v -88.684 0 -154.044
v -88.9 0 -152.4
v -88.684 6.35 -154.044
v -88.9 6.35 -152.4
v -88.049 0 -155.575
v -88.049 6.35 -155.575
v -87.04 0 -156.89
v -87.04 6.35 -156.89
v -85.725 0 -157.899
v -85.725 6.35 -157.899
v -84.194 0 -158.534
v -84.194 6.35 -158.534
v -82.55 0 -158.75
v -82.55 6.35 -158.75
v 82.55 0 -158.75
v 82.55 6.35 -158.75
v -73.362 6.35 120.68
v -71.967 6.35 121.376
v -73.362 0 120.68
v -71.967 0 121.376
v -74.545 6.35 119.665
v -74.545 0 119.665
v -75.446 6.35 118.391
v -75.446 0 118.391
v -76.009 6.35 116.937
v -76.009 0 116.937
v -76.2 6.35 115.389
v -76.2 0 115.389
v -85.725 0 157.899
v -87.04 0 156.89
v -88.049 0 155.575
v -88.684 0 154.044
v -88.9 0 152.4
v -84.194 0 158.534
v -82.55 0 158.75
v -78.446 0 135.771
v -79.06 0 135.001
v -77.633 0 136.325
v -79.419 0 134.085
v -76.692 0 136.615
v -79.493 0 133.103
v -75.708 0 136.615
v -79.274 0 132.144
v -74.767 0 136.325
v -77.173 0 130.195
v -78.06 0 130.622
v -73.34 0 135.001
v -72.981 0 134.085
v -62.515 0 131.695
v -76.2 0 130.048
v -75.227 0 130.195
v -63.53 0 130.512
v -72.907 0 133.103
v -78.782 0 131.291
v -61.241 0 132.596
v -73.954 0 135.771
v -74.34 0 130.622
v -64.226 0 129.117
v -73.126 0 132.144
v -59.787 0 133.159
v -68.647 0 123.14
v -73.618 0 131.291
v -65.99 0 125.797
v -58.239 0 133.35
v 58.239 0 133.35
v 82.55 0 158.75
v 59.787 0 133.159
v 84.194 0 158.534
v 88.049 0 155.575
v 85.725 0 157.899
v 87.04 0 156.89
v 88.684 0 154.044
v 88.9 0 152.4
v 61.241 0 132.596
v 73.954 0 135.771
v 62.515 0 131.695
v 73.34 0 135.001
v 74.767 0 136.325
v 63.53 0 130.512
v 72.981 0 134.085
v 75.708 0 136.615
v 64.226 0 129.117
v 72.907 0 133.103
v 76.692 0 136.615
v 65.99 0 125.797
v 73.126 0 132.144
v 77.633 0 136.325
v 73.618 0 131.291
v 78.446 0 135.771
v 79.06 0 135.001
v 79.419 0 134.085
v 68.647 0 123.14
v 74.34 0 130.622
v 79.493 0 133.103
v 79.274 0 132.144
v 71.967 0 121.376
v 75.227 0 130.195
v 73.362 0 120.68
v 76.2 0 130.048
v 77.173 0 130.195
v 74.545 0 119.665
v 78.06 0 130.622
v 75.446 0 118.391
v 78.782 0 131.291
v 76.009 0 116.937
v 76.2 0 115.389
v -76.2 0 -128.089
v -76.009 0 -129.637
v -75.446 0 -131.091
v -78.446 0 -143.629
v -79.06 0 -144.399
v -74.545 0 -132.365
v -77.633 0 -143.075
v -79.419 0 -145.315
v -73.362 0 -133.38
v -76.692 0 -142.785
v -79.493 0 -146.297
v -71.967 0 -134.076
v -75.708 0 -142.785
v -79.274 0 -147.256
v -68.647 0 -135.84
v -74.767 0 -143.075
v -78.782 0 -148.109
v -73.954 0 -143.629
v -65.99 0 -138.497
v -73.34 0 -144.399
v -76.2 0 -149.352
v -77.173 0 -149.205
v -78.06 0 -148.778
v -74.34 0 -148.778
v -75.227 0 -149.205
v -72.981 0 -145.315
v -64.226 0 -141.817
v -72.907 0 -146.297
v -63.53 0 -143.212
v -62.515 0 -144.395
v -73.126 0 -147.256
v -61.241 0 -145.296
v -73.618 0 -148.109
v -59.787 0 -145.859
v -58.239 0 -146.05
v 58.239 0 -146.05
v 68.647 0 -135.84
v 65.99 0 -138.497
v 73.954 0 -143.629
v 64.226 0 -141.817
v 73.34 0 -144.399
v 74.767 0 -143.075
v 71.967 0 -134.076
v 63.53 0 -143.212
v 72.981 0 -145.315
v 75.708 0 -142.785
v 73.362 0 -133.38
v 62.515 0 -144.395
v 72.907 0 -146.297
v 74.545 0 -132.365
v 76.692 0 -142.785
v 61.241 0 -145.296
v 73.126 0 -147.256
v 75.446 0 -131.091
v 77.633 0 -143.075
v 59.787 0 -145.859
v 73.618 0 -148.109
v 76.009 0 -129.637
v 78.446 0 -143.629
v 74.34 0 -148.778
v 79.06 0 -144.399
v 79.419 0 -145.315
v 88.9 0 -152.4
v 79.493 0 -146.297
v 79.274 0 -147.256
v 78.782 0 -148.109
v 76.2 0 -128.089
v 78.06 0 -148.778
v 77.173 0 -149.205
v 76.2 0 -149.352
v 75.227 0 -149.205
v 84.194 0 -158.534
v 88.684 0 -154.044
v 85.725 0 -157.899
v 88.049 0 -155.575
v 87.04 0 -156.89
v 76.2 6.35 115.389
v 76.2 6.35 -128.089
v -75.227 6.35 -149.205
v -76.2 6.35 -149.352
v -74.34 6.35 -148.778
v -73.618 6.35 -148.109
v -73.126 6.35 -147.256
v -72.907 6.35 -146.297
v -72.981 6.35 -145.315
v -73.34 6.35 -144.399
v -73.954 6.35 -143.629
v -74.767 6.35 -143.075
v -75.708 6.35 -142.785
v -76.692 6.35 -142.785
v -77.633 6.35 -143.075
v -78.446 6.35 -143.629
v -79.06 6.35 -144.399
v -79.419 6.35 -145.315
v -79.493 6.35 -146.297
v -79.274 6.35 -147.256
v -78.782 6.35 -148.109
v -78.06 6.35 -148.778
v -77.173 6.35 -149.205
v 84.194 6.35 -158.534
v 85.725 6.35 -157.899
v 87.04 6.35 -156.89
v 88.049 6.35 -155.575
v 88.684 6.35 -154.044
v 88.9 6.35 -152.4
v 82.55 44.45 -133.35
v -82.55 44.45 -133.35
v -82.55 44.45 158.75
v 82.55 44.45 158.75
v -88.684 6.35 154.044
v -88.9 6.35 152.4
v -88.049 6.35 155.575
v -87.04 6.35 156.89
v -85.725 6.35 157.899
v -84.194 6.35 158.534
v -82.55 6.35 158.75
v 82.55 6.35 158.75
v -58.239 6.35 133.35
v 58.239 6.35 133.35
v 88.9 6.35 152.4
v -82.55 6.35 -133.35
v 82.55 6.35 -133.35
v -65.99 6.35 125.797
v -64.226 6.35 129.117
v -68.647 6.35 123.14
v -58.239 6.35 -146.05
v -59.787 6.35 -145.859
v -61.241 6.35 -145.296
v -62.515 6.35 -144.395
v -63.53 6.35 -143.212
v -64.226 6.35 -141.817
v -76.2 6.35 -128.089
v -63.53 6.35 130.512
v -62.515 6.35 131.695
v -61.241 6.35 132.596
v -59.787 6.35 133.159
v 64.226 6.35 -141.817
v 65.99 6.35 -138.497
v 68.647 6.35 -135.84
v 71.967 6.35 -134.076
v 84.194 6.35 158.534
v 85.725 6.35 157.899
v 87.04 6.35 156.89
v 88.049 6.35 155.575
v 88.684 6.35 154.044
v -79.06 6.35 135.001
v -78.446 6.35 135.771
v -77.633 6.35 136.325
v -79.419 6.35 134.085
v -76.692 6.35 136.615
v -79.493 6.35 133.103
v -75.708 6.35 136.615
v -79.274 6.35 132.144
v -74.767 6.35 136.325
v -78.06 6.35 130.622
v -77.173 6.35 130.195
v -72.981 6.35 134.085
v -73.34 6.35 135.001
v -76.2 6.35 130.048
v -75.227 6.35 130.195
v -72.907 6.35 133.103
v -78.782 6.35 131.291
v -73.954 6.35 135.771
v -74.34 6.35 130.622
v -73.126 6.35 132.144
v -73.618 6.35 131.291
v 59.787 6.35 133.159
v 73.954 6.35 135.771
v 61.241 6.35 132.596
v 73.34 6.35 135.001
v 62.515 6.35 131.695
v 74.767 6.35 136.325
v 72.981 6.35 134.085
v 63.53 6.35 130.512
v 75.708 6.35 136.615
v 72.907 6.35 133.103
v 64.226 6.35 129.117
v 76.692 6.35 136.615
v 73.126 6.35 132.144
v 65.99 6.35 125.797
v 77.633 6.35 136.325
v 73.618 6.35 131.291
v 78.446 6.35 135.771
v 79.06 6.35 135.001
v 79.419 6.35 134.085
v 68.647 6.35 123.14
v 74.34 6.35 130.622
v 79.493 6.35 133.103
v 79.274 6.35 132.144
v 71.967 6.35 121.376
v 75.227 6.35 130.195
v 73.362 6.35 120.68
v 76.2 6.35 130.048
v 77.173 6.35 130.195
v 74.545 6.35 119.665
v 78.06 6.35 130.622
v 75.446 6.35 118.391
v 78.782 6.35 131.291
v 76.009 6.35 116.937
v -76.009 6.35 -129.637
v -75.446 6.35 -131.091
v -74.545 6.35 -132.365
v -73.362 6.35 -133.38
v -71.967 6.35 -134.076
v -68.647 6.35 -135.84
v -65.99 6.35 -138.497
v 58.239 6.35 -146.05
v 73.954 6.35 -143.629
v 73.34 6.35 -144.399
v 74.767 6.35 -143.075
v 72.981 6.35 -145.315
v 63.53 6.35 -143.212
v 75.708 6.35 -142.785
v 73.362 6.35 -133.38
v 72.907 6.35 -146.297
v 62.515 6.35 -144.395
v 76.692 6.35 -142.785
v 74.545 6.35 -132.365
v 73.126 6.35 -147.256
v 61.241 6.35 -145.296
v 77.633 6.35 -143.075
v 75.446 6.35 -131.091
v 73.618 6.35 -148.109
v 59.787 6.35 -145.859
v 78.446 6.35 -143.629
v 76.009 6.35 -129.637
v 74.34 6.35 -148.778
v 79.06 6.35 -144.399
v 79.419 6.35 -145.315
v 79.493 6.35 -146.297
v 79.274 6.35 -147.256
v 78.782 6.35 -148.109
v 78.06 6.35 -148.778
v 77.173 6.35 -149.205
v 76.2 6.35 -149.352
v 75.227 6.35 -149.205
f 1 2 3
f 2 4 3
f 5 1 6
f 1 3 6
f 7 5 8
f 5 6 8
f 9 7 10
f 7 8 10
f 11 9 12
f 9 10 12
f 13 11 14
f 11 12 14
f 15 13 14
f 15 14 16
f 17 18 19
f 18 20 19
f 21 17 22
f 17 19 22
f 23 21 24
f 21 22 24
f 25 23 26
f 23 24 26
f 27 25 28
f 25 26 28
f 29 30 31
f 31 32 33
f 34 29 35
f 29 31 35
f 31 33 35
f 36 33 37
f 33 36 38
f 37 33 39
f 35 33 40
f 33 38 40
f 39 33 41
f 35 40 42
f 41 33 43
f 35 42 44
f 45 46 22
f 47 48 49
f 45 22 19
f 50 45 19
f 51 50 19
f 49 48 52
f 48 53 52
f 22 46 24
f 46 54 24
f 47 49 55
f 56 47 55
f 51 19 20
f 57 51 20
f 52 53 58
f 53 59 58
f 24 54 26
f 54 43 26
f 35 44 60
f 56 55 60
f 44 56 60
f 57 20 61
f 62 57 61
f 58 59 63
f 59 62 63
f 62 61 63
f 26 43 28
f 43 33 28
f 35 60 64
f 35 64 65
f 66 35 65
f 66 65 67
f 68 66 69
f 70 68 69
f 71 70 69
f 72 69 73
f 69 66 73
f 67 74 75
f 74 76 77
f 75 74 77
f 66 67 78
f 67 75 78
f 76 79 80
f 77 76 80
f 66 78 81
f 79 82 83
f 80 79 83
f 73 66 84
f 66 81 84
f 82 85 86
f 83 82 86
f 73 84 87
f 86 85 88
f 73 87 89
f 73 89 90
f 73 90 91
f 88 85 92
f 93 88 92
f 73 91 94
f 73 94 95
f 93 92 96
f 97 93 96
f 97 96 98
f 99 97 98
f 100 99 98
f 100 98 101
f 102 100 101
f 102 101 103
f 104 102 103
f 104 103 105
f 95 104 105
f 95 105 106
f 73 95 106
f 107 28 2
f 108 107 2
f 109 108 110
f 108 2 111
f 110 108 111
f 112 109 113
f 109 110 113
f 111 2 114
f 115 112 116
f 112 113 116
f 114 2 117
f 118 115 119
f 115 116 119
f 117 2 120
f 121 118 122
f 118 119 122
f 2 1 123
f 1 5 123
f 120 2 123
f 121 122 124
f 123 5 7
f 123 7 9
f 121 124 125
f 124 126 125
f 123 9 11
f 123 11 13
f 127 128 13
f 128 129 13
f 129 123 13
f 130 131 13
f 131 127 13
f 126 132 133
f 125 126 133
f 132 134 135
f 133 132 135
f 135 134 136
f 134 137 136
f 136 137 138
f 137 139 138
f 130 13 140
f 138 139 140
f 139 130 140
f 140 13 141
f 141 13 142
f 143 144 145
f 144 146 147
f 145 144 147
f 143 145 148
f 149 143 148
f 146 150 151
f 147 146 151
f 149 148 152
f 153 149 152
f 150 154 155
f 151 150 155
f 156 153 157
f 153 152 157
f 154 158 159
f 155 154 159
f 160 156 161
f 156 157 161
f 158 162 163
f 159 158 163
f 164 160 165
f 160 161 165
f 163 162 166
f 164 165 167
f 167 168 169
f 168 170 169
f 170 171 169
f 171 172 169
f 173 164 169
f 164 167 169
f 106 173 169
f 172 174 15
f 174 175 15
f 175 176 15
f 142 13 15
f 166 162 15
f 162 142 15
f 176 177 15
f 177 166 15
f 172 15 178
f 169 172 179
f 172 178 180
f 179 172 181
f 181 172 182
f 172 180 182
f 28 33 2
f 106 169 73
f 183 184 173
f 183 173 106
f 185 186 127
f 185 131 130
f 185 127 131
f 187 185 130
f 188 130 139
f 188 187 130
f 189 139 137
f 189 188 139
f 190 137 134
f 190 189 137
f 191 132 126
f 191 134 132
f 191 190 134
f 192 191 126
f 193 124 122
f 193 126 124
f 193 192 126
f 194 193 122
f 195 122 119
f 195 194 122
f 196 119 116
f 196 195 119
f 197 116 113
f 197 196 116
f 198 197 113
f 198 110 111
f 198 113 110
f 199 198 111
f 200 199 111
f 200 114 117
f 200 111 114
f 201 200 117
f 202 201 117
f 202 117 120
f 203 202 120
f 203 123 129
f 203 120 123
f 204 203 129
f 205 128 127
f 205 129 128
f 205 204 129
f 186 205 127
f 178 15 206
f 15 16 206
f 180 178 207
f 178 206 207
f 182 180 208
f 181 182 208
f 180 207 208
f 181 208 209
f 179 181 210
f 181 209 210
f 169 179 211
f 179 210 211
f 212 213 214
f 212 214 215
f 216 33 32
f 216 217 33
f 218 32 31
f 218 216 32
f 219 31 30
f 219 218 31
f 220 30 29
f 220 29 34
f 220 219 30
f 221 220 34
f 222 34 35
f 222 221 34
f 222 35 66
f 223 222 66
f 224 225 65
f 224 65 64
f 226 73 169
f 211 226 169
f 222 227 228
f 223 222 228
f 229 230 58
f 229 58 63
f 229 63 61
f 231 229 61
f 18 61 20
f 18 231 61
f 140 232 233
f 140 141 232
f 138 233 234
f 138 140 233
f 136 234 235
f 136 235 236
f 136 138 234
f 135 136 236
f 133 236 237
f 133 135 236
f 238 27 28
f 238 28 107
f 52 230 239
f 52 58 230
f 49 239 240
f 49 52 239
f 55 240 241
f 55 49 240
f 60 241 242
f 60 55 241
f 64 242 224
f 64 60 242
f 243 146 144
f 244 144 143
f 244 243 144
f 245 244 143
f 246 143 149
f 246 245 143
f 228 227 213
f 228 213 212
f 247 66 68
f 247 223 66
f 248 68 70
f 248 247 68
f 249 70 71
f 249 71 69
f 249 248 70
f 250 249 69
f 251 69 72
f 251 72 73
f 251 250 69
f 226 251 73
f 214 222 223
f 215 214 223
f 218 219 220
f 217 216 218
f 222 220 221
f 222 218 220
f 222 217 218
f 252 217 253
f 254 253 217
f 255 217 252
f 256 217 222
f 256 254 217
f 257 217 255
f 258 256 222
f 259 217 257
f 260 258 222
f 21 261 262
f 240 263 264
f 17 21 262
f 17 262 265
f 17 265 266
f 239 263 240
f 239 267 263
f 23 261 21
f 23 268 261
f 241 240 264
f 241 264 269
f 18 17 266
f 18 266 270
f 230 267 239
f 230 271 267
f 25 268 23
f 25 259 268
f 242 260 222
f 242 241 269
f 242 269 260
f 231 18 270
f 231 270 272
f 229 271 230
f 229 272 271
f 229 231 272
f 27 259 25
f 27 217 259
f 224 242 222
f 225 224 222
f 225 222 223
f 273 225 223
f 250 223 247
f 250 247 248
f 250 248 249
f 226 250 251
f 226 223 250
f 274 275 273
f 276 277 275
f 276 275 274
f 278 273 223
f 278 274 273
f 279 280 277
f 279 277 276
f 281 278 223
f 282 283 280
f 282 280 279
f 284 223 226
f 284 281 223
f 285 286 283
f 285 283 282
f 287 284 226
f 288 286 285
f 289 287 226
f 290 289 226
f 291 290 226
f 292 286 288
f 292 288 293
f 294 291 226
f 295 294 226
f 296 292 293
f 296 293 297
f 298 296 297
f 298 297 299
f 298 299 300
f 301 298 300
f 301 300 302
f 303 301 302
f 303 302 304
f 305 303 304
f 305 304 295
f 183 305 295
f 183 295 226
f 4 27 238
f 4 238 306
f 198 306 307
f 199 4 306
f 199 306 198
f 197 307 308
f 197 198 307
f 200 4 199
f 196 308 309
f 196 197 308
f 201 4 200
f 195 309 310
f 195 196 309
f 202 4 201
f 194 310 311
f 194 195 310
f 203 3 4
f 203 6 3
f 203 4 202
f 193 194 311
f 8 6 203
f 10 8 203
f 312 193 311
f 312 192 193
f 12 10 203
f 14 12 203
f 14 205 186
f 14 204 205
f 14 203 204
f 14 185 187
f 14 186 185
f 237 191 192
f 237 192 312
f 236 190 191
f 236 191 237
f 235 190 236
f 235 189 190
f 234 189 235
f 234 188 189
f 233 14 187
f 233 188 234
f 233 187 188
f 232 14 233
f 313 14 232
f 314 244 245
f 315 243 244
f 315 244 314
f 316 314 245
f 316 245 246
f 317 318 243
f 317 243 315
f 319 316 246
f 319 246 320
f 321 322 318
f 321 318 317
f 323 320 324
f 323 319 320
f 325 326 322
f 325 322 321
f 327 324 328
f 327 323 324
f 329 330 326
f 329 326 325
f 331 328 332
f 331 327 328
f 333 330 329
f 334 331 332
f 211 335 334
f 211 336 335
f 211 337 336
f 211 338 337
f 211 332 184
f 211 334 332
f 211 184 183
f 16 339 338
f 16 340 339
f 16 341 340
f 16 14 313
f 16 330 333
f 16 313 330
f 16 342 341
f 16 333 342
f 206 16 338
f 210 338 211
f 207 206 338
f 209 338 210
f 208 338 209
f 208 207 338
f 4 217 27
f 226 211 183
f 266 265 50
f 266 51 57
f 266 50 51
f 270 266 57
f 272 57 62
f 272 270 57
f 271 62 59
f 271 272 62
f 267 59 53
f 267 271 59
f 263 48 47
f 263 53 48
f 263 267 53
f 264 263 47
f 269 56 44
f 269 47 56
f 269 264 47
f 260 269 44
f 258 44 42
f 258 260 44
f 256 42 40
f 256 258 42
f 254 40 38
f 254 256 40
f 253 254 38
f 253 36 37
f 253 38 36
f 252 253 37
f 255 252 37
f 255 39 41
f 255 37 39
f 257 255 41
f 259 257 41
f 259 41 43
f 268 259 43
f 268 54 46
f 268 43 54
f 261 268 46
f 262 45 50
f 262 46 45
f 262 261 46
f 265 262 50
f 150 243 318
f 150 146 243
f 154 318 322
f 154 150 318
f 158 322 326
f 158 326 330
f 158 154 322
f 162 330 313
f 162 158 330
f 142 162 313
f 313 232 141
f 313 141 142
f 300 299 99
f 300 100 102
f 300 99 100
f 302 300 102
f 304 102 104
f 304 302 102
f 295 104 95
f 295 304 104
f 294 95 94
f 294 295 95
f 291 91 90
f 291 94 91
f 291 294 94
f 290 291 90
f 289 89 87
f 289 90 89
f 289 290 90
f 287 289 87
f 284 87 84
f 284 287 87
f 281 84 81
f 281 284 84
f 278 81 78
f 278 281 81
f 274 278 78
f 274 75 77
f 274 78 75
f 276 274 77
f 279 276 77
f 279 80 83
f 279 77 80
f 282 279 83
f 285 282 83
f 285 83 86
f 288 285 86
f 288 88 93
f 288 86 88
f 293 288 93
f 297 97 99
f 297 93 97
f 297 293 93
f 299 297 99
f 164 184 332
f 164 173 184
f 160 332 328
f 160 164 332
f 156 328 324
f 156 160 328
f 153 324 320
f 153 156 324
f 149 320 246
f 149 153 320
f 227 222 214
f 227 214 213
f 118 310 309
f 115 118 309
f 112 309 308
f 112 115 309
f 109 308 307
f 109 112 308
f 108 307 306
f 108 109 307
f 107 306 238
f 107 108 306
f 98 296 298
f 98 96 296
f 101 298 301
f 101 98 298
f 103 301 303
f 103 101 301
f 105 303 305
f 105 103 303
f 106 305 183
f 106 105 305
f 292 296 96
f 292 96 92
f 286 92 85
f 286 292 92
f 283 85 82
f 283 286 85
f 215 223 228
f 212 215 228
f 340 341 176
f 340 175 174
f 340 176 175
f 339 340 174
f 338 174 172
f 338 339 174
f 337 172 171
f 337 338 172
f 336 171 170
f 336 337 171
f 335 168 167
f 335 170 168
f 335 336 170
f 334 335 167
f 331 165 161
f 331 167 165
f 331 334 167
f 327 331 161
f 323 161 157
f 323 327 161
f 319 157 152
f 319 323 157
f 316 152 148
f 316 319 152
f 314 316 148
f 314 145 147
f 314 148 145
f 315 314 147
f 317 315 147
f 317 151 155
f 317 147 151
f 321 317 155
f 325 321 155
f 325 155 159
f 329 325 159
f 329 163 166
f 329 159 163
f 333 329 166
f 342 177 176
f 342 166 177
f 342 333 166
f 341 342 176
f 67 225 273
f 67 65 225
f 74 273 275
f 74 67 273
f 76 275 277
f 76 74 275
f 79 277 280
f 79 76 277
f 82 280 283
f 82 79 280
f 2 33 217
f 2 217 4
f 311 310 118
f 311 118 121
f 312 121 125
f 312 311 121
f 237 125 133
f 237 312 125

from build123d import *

# Parameters (mm, degrees)
SKETCH1_W               = 177.8
SKETCH1_H               = 317.5
BASE_DEPTH              = 6.35
HOLES_DEPTH             = 183.057944073
HOLES_DEPTH_BACK        = 183.057944073
SKETCH3_R               = 3.302
INNER_CUTOUT_DEPTH      = 183.057944073
INNER_CUTOUT_DEPTH_BACK = 183.057944073
FILLET1_R               = 6.35
SKETCH2_W               = 165.1
SKETCH2_H               = 292.1
PADDING_DEPTH           = 38.1


with BuildPart() as part:
    # Sketch1 → Base (new body)
    with BuildSketch(Plane(origin=(0, 0, 0), x_dir=(1, 0, 0), z_dir=(0, 1, 0))):
        Rectangle(SKETCH1_W, SKETCH1_H)
    extrude(amount=BASE_DEPTH)

    # Sketch3 → Holes (cut, two sides: drawn at the far end of the back side and taken through both)
    with BuildSketch(Plane.XZ.offset(-HOLES_DEPTH_BACK)):
        with Locations(Location((-76.2, -146.05, 0), (0, 0, 270))):
            Circle(SKETCH3_R)
        with Locations(Location((76.2, -146.05, 0), (0, 0, 270))):
            Circle(SKETCH3_R)
        with Locations(Location((76.2, 133.35, 0), (0, 0, 270))):
            Circle(SKETCH3_R)
        with Locations(Location((-76.2, 133.35, 0), (0, 0, 270))):
            Circle(SKETCH3_R)
    extrude(amount=HOLES_DEPTH + HOLES_DEPTH_BACK, mode=Mode.SUBTRACT)

    # Sketch6 → Inner Cutout (cut, two sides: drawn at the far end of the back side and taken through both)
    with BuildSketch(Plane.XZ.offset(-INNER_CUTOUT_DEPTH_BACK)):
        with BuildLine():
            Line((-76.2, 120.65), (-76.2, -133.35))
            ThreePointArc((-76.2, -133.35), (-67.219743879, -137.069743879), (-63.5, -146.05))
            Line((-63.5, -146.05), (63.5, -146.05))
            ThreePointArc((63.5, -146.05), (67.219743879, -137.069743879), (76.2, -133.35))
            Line((76.2, -133.35), (76.2, 120.65))
            ThreePointArc((76.2, 120.65), (67.219743879, 124.369743879), (63.5, 133.35))
            Line((63.5, 133.35), (-63.5, 133.35))
            ThreePointArc((-63.5, 133.35), (-67.219743879, 124.369743879), (-76.2, 120.65))
        make_face()
    extrude(amount=INNER_CUTOUT_DEPTH + INNER_CUTOUT_DEPTH_BACK, mode=Mode.SUBTRACT)

    # Fillet1
    fillet1_edges = [part.edges().sort_by_distance(p)[0] for p in [
        (-76.2, 3.175, 120.65),
        (-63.5, 3.175, 133.35),
        (63.5, 3.175, 133.35),
        (76.2, 3.175, 120.65),
        (76.2, 3.175, -133.35),
        (63.5, 3.175, -146.05),
        (-63.5, 3.175, -146.05),
        (-76.2, 3.175, -133.35),
        (88.9, 3.175, 158.75),
        (-88.9, 3.175, 158.75),
        (-88.9, 3.175, -158.75),
        (88.9, 3.175, -158.75),
    ]]
    fillet(fillet1_edges, radius=FILLET1_R)


with BuildPart() as body_2:
    # Sketch2 → Padding (new body)
    with BuildSketch(Plane(origin=(0, 6.35, 0), x_dir=(1, 0, 0), z_dir=(0, 1, 0))):
        with Locations((0, -12.7)):
            Rectangle(SKETCH2_W, SKETCH2_H)
    extrude(amount=PADDING_DEPTH)


solid = Compound([part.part, body_2.part])
